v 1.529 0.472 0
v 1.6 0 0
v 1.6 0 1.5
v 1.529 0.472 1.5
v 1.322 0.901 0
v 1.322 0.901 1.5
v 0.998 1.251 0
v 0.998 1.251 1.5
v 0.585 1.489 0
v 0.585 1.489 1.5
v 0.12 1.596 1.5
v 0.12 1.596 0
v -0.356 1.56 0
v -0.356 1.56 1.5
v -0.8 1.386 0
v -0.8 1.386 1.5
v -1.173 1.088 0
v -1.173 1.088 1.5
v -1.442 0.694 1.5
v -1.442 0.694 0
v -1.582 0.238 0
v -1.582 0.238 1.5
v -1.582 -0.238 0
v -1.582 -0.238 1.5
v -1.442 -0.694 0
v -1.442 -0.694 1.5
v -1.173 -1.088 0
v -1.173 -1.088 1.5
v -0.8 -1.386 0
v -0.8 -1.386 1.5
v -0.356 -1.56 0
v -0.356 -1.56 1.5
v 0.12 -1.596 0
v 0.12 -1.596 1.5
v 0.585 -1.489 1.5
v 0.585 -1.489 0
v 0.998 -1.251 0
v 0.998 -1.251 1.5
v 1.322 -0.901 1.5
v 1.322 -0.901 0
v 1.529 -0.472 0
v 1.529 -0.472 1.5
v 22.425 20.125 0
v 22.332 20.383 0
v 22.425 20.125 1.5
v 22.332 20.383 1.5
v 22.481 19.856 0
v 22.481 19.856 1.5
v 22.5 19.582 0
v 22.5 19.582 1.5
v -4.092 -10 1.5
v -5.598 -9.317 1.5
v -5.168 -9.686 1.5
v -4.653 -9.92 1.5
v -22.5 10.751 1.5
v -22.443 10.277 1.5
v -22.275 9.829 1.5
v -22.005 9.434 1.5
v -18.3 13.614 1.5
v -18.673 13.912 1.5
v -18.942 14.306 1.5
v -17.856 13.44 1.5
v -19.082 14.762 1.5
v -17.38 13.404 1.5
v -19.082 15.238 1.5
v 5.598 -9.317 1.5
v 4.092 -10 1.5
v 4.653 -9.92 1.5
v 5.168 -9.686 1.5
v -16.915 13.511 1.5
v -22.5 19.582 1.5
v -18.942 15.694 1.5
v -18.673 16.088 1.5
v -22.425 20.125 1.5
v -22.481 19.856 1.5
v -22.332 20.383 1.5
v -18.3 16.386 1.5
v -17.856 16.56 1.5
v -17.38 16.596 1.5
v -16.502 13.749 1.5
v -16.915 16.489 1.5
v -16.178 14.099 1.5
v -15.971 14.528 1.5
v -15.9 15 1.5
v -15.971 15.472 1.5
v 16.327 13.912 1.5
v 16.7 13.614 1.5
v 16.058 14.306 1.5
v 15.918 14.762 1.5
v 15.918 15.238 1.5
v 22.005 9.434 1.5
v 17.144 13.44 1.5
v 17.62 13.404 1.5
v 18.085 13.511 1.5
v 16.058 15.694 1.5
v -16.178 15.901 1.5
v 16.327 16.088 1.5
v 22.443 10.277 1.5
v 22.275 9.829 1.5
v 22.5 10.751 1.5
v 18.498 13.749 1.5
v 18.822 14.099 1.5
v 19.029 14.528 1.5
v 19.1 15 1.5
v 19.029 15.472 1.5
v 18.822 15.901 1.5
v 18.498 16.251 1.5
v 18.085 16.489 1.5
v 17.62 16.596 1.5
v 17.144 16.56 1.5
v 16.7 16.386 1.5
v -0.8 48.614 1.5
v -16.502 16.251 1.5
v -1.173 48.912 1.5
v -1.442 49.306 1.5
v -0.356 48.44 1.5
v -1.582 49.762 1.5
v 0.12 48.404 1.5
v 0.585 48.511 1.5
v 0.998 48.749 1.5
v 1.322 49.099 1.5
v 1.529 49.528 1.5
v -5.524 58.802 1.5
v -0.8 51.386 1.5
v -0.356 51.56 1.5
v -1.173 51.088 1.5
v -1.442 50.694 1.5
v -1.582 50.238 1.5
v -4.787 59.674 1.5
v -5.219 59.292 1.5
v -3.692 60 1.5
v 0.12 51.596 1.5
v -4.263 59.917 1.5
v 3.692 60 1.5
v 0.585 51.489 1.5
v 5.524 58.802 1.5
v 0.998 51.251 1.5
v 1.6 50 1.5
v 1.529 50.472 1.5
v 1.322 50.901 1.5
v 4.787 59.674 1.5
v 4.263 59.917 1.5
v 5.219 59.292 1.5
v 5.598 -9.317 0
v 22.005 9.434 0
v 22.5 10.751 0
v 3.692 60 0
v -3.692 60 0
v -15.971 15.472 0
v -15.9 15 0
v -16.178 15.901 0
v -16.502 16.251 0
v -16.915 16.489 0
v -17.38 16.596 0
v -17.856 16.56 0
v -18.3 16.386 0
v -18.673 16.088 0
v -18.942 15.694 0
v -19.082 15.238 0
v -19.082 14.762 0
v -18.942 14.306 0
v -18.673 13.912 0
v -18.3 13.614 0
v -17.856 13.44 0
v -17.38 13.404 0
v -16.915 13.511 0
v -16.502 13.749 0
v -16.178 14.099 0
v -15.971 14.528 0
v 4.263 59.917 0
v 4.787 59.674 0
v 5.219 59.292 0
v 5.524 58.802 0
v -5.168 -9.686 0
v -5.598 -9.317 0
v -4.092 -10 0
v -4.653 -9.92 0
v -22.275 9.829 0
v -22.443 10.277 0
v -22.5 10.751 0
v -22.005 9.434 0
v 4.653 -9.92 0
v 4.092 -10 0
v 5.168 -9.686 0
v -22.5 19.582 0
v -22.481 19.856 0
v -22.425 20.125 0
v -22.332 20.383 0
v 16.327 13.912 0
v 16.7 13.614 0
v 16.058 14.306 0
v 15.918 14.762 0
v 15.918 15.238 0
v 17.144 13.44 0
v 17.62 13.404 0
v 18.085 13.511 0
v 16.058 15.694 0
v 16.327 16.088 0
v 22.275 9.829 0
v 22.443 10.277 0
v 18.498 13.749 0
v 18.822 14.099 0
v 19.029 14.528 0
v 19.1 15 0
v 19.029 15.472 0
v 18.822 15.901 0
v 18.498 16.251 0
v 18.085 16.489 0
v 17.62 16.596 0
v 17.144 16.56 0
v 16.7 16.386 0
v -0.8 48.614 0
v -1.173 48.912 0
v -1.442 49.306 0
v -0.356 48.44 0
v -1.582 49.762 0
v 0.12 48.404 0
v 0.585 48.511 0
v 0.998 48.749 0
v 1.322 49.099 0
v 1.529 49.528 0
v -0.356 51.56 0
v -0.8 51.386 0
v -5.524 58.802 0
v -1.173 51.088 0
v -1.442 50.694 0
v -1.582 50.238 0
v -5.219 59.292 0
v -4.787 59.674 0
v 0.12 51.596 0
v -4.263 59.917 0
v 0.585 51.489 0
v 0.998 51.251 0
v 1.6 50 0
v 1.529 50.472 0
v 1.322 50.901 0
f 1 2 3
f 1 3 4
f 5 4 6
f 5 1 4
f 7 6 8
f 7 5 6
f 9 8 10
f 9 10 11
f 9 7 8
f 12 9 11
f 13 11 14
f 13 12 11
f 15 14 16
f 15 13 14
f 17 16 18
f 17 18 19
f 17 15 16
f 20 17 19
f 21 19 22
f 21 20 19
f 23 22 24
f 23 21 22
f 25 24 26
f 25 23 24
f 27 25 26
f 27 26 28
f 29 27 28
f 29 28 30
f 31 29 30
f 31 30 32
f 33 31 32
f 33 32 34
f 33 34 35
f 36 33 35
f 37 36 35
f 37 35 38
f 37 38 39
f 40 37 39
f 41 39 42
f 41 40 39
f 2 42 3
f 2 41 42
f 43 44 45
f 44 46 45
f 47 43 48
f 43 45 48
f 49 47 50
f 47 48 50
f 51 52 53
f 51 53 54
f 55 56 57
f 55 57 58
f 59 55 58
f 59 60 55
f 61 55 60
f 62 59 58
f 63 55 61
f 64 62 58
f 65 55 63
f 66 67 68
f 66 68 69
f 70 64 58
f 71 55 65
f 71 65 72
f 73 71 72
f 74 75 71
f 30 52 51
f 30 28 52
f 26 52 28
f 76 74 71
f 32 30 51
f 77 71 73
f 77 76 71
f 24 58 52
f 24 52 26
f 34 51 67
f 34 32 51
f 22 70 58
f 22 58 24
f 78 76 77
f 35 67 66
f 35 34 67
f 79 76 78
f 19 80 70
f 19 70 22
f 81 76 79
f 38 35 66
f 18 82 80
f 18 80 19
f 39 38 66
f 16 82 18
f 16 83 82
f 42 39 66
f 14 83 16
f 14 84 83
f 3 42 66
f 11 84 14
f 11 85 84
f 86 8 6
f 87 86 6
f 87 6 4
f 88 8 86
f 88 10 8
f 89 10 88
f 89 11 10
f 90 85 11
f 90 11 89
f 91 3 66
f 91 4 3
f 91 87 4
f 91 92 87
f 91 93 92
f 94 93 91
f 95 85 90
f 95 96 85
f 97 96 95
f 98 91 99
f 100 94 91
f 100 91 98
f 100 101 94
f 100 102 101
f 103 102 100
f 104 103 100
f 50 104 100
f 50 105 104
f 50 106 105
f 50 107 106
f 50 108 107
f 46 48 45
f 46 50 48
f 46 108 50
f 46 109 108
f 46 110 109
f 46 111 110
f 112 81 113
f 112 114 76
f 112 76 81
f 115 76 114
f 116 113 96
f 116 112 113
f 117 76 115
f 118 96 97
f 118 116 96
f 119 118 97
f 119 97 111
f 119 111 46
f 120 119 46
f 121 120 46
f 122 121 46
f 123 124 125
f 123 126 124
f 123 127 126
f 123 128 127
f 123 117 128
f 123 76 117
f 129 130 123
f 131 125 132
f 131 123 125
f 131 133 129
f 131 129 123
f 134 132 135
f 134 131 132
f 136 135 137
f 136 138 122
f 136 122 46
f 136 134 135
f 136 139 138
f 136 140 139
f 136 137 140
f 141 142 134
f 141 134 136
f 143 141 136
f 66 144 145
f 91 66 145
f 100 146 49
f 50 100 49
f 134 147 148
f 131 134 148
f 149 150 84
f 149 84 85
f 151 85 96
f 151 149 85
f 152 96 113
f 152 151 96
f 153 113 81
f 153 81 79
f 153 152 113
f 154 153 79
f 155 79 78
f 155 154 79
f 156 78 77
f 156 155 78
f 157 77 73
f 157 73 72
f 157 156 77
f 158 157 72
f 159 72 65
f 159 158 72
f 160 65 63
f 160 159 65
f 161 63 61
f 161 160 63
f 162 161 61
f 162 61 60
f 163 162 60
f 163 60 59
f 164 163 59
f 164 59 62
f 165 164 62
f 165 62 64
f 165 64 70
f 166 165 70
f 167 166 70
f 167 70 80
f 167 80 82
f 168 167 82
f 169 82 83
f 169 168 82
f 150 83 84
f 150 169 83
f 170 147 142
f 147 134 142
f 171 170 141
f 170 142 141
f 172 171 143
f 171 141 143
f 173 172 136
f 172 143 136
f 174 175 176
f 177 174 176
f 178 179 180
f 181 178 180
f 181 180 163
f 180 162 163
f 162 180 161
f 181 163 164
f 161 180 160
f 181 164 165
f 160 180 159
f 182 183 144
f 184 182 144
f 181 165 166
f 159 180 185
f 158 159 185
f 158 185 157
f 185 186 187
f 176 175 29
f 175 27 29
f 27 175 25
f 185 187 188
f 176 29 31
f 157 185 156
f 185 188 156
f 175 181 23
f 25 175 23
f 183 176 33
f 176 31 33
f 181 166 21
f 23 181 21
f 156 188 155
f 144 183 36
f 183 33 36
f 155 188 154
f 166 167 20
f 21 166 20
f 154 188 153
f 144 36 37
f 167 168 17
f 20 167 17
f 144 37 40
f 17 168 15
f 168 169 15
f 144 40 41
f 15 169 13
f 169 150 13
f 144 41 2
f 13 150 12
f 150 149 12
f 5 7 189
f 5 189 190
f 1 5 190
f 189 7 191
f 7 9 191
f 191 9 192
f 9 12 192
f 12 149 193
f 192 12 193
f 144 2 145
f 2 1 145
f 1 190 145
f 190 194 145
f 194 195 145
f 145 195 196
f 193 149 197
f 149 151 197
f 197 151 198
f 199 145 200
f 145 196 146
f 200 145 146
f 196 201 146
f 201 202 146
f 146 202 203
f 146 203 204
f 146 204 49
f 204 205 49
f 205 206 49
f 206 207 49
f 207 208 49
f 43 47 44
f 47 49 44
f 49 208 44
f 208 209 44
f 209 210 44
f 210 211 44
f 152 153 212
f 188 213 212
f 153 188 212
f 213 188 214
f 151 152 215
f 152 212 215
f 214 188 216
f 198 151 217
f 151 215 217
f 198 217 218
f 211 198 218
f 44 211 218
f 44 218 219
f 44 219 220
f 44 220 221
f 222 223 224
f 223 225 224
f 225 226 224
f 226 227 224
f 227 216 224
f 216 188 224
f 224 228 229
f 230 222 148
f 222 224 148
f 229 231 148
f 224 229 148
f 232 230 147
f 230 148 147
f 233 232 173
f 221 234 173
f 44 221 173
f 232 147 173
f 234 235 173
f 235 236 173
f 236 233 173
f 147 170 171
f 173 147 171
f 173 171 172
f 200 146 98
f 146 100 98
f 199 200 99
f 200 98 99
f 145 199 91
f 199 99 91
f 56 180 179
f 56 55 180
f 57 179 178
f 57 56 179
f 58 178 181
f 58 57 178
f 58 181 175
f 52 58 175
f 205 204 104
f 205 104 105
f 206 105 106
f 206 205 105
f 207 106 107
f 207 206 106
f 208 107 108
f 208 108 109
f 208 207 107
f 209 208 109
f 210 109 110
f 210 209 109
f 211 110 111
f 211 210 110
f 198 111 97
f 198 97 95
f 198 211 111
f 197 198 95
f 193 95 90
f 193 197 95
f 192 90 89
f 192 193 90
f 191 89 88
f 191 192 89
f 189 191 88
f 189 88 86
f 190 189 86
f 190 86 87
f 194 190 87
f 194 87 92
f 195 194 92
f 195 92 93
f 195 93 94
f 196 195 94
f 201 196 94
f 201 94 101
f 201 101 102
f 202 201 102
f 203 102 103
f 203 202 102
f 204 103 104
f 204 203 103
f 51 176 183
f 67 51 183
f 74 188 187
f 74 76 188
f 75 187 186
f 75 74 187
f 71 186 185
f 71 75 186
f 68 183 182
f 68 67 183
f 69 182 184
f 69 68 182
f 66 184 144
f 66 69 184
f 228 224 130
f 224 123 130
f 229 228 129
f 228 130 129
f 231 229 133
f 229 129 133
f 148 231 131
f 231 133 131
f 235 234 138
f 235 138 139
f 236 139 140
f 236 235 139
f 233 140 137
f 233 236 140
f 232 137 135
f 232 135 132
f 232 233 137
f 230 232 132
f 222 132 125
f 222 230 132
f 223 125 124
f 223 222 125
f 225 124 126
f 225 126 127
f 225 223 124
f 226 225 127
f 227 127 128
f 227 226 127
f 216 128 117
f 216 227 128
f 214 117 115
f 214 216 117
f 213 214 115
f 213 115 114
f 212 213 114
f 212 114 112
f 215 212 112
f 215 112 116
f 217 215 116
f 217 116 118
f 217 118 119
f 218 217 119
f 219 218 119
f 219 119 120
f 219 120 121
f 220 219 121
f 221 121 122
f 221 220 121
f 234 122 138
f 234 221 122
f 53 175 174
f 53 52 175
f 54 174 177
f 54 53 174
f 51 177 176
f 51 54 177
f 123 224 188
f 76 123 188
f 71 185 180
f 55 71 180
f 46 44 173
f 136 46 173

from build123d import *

# Parameters (mm, degrees)
SKETCH_1_R      = 1.6
EXTRUDE_1_DEPTH = 1.5
FILLET_1_R      = 2


with BuildPart() as part:
    # ｽｹｯﾁ1 → ﾎﾞｽ - 押し出し1 (new body)
    with BuildSketch(Plane.XY):
        Polygon((-5, 60), (-22.5, 20), (-22.5, 10), (-5, -10), (5, -10), (22.5, 10), (22.5, 20), (5, 60), align=None)
        Circle(SKETCH_1_R, mode=Mode.SUBTRACT)
        with Locations((0, 50)):
            Circle(SKETCH_1_R, mode=Mode.SUBTRACT)
        with Locations((-17.5, 15)):
            Circle(SKETCH_1_R, mode=Mode.SUBTRACT)
        with Locations((17.5, 15)):
            Circle(SKETCH_1_R, mode=Mode.SUBTRACT)
    extrude(amount=EXTRUDE_1_DEPTH)

    # ﾌｨﾚｯﾄ1
    fillet_1_edges = [part.edges().sort_by_distance(p)[0] for p in [
        (22.5, 20, 0.75),
        (22.5, 10, 0.75),
        (5, -10, 0.75),
        (-5, -10, 0.75),
        (-22.5, 10, 0.75),
        (-22.5, 20, 0.75),
        (-5, 60, 0.75),
        (5, 60, 0.75),
    ]]
    fillet(fillet_1_edges, radius=FILLET_1_R)


solid = part.part
